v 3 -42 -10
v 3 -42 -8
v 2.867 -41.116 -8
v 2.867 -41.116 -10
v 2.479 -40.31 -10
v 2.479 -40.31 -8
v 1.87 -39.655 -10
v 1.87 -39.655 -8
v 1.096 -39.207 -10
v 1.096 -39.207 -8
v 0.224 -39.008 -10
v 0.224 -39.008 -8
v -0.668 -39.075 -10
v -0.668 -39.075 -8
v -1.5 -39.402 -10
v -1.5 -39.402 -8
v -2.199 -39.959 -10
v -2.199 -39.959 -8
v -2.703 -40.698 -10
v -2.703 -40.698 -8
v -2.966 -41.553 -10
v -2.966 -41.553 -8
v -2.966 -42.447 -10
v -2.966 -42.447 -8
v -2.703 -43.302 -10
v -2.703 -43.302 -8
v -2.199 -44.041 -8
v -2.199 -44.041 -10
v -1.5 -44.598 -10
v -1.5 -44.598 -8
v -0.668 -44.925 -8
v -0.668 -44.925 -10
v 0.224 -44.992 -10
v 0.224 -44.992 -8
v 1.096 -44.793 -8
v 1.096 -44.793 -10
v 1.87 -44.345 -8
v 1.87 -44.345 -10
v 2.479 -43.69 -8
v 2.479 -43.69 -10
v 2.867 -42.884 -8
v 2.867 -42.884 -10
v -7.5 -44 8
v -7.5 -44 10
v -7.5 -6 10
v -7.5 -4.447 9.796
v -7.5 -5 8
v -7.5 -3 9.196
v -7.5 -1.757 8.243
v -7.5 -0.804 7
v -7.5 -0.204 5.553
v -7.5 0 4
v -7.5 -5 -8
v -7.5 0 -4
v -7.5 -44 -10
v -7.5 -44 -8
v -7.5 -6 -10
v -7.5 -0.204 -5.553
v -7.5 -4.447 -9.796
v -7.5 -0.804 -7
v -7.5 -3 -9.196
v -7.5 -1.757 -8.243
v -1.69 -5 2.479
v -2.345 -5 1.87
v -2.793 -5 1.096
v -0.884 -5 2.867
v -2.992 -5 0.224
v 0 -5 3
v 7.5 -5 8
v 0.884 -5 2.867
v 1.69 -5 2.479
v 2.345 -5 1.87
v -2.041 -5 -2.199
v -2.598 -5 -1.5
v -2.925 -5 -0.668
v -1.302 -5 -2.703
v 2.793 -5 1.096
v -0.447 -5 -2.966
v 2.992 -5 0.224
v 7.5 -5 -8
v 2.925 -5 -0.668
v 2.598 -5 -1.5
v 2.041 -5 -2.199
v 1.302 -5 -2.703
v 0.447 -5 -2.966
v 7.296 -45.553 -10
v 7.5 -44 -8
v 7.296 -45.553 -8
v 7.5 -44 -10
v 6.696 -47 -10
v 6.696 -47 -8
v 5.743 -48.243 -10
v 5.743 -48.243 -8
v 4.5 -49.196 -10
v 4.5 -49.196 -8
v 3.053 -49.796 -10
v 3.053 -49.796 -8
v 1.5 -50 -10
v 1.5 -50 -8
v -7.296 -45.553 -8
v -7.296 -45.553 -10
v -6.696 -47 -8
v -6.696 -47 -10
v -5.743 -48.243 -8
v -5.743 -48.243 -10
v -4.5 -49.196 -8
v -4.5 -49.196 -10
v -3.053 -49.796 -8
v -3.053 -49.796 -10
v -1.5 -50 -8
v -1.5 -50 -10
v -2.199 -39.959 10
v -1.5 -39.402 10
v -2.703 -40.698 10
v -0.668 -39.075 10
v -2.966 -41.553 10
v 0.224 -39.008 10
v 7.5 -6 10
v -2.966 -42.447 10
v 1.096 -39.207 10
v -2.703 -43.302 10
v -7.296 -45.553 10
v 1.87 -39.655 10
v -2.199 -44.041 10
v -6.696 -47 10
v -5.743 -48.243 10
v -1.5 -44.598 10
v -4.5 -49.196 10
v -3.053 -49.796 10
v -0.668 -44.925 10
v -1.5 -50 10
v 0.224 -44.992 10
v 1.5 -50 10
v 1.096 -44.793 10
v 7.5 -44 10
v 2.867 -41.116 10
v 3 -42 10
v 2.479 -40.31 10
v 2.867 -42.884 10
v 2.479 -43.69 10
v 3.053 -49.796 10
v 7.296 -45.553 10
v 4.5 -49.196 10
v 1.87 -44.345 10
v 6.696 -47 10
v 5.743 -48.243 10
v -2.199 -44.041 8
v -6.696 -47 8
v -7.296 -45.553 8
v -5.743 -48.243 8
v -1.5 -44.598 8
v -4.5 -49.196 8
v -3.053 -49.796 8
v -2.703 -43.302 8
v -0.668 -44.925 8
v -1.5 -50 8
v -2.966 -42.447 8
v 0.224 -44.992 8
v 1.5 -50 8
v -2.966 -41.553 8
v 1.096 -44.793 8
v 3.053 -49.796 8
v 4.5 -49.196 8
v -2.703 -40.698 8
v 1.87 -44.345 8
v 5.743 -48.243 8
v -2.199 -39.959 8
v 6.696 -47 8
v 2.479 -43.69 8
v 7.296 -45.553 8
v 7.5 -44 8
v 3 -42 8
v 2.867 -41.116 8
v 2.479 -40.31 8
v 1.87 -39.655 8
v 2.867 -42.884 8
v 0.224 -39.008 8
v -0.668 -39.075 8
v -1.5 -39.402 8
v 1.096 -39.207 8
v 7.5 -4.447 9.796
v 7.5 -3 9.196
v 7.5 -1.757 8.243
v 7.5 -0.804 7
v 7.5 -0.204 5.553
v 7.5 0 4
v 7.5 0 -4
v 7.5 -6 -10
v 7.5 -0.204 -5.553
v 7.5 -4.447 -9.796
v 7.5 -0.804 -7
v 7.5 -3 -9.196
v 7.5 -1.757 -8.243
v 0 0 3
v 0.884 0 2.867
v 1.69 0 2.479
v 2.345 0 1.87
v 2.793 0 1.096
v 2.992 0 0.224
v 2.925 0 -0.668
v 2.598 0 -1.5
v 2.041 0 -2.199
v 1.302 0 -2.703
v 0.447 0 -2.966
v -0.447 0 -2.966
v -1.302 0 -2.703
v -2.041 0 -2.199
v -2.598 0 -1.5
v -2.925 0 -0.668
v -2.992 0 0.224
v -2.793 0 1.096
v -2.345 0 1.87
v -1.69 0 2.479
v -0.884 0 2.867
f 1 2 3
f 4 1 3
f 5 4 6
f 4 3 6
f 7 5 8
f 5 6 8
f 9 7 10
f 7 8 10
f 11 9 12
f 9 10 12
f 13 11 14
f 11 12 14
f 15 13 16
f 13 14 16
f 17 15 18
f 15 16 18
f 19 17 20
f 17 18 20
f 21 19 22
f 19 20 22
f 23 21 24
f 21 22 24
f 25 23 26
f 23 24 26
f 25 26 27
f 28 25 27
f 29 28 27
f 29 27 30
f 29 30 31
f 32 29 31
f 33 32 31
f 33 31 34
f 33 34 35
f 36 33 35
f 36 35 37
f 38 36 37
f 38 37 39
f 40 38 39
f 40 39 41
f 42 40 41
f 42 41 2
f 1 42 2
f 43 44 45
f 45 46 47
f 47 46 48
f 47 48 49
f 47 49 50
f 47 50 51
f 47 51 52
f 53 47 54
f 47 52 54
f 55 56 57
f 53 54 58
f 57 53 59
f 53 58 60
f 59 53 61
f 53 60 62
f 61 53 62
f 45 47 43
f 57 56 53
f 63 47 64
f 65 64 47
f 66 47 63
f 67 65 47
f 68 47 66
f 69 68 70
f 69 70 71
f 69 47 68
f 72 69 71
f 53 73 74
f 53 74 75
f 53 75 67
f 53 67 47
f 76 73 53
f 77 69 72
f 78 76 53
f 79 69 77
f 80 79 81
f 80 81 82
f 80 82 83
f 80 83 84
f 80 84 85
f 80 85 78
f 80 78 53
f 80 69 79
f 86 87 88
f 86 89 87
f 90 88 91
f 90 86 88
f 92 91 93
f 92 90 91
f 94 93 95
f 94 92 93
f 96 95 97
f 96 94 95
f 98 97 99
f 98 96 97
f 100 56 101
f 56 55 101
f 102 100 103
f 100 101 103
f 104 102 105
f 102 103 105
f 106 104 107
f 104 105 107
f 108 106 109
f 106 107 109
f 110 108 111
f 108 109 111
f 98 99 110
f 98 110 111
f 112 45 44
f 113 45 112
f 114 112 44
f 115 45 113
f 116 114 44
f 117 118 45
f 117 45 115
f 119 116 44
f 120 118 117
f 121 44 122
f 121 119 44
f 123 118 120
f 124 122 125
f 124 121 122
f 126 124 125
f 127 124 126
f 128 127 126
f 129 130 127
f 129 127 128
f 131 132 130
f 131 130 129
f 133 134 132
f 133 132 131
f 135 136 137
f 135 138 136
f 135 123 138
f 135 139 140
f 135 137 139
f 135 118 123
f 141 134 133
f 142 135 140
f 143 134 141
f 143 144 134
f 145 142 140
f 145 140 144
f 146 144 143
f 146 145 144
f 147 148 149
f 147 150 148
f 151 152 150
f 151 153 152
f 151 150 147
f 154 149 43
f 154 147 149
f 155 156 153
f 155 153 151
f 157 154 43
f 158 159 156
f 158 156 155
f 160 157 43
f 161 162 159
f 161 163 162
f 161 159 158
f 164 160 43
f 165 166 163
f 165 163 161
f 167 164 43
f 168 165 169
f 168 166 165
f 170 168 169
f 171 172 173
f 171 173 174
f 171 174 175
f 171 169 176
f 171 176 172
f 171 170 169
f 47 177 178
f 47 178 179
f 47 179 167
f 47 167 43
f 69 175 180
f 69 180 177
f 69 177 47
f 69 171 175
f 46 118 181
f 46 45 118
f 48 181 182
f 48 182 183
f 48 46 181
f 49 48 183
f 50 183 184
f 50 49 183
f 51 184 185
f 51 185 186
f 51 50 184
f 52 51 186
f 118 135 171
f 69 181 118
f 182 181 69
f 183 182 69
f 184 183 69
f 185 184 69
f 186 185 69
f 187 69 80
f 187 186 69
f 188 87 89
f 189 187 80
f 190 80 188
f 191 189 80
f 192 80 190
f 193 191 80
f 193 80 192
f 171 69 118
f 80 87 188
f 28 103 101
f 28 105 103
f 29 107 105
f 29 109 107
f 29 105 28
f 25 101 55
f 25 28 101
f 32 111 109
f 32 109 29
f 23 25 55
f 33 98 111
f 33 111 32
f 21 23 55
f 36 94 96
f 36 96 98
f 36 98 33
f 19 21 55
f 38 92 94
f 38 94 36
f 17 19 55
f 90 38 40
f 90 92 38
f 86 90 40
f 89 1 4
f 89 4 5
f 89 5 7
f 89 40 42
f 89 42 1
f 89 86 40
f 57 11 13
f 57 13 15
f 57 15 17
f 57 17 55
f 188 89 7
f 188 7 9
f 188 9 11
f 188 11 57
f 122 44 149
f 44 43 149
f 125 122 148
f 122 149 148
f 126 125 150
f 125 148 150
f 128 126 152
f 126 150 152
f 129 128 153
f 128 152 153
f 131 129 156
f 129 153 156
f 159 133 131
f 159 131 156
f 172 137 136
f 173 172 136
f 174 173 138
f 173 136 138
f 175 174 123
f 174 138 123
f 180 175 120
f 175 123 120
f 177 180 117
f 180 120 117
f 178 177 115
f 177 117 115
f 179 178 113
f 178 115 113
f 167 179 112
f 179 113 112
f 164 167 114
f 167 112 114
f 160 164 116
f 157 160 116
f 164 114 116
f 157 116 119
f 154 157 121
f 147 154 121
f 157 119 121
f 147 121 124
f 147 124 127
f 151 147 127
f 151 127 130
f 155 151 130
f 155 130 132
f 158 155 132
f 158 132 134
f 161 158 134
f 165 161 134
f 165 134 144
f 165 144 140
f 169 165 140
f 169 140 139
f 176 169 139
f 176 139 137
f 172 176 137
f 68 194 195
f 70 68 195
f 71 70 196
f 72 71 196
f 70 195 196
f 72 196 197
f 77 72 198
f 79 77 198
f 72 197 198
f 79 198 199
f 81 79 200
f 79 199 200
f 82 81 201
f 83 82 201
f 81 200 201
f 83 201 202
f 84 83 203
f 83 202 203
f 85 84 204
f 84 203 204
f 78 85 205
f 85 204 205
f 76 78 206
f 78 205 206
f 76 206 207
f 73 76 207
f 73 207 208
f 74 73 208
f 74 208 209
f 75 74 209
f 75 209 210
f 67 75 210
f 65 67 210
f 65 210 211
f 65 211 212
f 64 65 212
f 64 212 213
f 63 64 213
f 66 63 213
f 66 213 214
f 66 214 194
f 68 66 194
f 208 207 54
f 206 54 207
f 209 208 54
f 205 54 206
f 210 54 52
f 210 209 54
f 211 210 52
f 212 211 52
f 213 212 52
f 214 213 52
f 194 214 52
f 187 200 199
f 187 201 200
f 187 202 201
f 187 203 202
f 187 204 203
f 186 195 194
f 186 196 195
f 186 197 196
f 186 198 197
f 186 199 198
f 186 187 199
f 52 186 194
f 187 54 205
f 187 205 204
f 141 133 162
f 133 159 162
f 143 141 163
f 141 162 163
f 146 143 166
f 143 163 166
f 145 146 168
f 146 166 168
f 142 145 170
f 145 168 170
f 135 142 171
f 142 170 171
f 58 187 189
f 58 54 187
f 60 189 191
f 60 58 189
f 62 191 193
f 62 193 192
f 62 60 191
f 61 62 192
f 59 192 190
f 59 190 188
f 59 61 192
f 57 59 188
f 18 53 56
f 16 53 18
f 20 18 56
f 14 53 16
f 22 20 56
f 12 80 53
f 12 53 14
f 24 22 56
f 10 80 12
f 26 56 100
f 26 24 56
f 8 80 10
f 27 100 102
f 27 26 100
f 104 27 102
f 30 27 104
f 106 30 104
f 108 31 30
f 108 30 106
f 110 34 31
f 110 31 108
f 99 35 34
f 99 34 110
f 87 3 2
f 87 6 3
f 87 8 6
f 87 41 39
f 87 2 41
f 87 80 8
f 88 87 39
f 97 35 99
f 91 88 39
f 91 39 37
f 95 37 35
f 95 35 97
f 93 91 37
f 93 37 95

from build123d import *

# Parameters (mm, degrees)
BOSS_EXTRUDE1_DEPTH = 7.5
SKETCH2_R           = 3
CUT_EXTRUDE1_DEPTH  = 15
SKETCH3_R           = 3
CUT_EXTRUDE2_DEPTH  = 55.371407927
FILLET1_R           = 6


with BuildPart() as part:
    # Sketch1 → Boss-Extrude1 (new, symmetric)
    with BuildSketch(Plane(origin=(0, 0, 0), x_dir=(0, 0, -1), z_dir=(1, 0, 0))):
        Polygon((0, 0), (-10, 0), (-10, -50), (-8, -50), (-8, -5), (8, -5), (8, -50), (10, -50), (10, 0), align=None)
    extrude(amount=BOSS_EXTRUDE1_DEPTH, both=True)

    # Sketch2 → Cut-Extrude1 (cut)
    with BuildSketch(Plane(origin=(0, 0, 0), x_dir=(1, 0, 0), z_dir=(0, 1, 0))):
        with Locations(Location((0, 0, 0), (0, 0, 270))):
            Circle(SKETCH2_R)
    extrude(amount=-CUT_EXTRUDE1_DEPTH, mode=Mode.SUBTRACT)

    # Sketch3 → Cut-Extrude2 (cut, through all)
    with BuildSketch(Plane.XY.offset(10)):
        with Locations((0, -42)):
            Circle(SKETCH3_R)
    extrude(amount=-CUT_EXTRUDE2_DEPTH, mode=Mode.SUBTRACT)

    # Fillet1
    fillet1_edges = [part.edges().sort_by_distance(p)[0] for p in [
        (-7.5, -50, 9),
        (0, 0, -10),
        (0, 0, 10),
        (7.5, -50, 9),
        (7.5, -50, -9),
        (-7.5, -50, -9),
    ]]
    fillet(fillet1_edges, radius=FILLET1_R)


solid = part.part
